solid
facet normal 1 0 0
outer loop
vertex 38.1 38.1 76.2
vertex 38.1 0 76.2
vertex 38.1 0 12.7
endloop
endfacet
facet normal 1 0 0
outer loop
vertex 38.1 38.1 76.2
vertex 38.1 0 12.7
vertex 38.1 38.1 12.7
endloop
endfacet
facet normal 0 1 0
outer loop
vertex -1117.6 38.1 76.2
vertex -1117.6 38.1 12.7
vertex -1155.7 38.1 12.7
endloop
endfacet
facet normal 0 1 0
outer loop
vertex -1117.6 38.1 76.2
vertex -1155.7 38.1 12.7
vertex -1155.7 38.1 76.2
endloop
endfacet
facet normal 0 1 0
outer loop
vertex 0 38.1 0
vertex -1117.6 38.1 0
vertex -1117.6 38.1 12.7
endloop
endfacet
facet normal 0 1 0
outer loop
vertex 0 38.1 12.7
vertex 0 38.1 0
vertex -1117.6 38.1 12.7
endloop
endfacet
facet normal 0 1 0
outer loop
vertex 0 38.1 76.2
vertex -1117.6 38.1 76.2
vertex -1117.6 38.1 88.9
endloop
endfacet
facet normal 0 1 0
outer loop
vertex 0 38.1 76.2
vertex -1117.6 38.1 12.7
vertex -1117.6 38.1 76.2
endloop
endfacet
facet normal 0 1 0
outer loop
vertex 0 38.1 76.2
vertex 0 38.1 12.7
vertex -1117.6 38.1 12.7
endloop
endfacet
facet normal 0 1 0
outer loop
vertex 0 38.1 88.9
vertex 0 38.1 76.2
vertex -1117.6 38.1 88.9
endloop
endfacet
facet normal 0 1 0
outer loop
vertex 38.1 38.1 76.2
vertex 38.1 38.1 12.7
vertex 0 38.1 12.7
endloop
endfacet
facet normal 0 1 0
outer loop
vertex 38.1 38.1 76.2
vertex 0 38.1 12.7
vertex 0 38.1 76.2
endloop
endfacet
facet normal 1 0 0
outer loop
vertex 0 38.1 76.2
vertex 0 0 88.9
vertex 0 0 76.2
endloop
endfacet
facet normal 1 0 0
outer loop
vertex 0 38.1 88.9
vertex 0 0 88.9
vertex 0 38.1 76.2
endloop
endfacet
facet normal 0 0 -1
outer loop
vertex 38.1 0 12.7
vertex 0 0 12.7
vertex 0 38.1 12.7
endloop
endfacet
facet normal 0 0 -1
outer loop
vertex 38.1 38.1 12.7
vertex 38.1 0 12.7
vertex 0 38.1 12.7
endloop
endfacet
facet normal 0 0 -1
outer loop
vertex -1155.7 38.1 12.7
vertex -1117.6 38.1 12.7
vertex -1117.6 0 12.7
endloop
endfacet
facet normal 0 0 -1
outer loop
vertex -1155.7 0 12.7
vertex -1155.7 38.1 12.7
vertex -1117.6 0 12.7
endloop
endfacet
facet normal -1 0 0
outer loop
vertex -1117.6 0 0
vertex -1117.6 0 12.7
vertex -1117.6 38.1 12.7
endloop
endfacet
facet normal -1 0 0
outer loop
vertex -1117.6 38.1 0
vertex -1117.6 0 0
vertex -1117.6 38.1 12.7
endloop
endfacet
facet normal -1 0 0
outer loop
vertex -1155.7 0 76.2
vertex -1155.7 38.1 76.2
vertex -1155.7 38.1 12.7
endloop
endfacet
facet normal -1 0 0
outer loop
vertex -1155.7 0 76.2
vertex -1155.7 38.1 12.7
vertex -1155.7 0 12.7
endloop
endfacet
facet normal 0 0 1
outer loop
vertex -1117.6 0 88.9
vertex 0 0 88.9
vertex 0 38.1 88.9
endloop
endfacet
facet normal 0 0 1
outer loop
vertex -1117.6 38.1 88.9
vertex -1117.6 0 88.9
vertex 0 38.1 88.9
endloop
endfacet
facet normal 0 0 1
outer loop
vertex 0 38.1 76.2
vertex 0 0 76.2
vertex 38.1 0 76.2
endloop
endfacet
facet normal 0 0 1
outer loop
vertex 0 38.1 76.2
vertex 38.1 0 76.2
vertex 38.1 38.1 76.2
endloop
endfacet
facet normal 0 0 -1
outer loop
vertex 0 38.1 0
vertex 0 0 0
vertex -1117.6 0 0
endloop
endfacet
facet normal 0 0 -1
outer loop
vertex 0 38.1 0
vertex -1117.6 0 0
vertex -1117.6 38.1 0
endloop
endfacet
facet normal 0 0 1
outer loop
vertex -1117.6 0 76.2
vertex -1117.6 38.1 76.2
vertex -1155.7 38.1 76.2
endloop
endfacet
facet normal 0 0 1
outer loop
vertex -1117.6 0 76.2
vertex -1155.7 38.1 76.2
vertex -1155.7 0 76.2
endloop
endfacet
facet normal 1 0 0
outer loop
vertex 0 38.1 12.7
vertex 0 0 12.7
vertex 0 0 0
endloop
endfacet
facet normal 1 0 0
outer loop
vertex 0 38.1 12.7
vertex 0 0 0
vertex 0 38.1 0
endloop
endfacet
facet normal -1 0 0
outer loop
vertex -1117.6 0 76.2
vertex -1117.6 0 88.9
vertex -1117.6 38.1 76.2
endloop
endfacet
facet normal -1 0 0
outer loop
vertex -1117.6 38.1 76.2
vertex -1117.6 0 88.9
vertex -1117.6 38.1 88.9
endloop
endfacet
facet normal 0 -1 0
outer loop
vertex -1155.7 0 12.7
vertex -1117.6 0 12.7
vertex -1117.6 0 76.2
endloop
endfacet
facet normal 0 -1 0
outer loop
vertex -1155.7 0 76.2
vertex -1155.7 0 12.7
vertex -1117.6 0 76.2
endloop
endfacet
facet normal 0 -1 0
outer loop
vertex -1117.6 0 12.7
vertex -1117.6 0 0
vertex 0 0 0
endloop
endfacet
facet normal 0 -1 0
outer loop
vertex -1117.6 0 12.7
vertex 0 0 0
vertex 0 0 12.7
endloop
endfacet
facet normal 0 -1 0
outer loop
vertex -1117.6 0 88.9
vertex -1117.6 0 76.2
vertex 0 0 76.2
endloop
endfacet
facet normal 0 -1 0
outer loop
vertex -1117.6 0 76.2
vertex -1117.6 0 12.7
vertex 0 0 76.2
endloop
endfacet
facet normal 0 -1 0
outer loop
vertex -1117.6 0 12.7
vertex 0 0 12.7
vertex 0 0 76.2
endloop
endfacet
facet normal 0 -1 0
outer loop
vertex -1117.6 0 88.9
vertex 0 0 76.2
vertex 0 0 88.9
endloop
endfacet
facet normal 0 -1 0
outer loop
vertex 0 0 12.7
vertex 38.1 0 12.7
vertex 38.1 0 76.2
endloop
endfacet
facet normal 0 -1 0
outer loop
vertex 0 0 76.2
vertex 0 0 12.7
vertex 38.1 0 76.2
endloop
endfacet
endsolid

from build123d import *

# Parameters (mm, degrees)
F0_W     = 38.1
F0_H     = 88.9
F1_DEPTH = 1117.6
F2_W     = 38.1
F2_H     = 63.5
F3_DEPTH = 38.1
F4_W     = 38.1
F4_H     = 63.5
F5_DEPTH = 38.1


with BuildPart() as f1:
    # F0 (on Right) → F1 (new body)
    with BuildSketch(Plane.YZ):
        with Locations((19.05, 44.45)):
            Rectangle(F0_W, F0_H)
    extrude(amount=-F1_DEPTH)

    # F2 (on face) → F3 (join)
    with BuildSketch(Plane.YZ):
        with Locations((19.05, 44.45)):
            Rectangle(F2_W, F2_H)
    extrude(amount=F3_DEPTH)

    # F4 (on face) → F5 (join)
    with BuildSketch(Plane(origin=(-1117.6, 0, 0), x_dir=(0, -1, 0), z_dir=(-1, 0, 0))):
        with Locations((-19.05, 44.45)):
            Rectangle(F4_W, F4_H)
    extrude(amount=F5_DEPTH)


solid = f1.part
